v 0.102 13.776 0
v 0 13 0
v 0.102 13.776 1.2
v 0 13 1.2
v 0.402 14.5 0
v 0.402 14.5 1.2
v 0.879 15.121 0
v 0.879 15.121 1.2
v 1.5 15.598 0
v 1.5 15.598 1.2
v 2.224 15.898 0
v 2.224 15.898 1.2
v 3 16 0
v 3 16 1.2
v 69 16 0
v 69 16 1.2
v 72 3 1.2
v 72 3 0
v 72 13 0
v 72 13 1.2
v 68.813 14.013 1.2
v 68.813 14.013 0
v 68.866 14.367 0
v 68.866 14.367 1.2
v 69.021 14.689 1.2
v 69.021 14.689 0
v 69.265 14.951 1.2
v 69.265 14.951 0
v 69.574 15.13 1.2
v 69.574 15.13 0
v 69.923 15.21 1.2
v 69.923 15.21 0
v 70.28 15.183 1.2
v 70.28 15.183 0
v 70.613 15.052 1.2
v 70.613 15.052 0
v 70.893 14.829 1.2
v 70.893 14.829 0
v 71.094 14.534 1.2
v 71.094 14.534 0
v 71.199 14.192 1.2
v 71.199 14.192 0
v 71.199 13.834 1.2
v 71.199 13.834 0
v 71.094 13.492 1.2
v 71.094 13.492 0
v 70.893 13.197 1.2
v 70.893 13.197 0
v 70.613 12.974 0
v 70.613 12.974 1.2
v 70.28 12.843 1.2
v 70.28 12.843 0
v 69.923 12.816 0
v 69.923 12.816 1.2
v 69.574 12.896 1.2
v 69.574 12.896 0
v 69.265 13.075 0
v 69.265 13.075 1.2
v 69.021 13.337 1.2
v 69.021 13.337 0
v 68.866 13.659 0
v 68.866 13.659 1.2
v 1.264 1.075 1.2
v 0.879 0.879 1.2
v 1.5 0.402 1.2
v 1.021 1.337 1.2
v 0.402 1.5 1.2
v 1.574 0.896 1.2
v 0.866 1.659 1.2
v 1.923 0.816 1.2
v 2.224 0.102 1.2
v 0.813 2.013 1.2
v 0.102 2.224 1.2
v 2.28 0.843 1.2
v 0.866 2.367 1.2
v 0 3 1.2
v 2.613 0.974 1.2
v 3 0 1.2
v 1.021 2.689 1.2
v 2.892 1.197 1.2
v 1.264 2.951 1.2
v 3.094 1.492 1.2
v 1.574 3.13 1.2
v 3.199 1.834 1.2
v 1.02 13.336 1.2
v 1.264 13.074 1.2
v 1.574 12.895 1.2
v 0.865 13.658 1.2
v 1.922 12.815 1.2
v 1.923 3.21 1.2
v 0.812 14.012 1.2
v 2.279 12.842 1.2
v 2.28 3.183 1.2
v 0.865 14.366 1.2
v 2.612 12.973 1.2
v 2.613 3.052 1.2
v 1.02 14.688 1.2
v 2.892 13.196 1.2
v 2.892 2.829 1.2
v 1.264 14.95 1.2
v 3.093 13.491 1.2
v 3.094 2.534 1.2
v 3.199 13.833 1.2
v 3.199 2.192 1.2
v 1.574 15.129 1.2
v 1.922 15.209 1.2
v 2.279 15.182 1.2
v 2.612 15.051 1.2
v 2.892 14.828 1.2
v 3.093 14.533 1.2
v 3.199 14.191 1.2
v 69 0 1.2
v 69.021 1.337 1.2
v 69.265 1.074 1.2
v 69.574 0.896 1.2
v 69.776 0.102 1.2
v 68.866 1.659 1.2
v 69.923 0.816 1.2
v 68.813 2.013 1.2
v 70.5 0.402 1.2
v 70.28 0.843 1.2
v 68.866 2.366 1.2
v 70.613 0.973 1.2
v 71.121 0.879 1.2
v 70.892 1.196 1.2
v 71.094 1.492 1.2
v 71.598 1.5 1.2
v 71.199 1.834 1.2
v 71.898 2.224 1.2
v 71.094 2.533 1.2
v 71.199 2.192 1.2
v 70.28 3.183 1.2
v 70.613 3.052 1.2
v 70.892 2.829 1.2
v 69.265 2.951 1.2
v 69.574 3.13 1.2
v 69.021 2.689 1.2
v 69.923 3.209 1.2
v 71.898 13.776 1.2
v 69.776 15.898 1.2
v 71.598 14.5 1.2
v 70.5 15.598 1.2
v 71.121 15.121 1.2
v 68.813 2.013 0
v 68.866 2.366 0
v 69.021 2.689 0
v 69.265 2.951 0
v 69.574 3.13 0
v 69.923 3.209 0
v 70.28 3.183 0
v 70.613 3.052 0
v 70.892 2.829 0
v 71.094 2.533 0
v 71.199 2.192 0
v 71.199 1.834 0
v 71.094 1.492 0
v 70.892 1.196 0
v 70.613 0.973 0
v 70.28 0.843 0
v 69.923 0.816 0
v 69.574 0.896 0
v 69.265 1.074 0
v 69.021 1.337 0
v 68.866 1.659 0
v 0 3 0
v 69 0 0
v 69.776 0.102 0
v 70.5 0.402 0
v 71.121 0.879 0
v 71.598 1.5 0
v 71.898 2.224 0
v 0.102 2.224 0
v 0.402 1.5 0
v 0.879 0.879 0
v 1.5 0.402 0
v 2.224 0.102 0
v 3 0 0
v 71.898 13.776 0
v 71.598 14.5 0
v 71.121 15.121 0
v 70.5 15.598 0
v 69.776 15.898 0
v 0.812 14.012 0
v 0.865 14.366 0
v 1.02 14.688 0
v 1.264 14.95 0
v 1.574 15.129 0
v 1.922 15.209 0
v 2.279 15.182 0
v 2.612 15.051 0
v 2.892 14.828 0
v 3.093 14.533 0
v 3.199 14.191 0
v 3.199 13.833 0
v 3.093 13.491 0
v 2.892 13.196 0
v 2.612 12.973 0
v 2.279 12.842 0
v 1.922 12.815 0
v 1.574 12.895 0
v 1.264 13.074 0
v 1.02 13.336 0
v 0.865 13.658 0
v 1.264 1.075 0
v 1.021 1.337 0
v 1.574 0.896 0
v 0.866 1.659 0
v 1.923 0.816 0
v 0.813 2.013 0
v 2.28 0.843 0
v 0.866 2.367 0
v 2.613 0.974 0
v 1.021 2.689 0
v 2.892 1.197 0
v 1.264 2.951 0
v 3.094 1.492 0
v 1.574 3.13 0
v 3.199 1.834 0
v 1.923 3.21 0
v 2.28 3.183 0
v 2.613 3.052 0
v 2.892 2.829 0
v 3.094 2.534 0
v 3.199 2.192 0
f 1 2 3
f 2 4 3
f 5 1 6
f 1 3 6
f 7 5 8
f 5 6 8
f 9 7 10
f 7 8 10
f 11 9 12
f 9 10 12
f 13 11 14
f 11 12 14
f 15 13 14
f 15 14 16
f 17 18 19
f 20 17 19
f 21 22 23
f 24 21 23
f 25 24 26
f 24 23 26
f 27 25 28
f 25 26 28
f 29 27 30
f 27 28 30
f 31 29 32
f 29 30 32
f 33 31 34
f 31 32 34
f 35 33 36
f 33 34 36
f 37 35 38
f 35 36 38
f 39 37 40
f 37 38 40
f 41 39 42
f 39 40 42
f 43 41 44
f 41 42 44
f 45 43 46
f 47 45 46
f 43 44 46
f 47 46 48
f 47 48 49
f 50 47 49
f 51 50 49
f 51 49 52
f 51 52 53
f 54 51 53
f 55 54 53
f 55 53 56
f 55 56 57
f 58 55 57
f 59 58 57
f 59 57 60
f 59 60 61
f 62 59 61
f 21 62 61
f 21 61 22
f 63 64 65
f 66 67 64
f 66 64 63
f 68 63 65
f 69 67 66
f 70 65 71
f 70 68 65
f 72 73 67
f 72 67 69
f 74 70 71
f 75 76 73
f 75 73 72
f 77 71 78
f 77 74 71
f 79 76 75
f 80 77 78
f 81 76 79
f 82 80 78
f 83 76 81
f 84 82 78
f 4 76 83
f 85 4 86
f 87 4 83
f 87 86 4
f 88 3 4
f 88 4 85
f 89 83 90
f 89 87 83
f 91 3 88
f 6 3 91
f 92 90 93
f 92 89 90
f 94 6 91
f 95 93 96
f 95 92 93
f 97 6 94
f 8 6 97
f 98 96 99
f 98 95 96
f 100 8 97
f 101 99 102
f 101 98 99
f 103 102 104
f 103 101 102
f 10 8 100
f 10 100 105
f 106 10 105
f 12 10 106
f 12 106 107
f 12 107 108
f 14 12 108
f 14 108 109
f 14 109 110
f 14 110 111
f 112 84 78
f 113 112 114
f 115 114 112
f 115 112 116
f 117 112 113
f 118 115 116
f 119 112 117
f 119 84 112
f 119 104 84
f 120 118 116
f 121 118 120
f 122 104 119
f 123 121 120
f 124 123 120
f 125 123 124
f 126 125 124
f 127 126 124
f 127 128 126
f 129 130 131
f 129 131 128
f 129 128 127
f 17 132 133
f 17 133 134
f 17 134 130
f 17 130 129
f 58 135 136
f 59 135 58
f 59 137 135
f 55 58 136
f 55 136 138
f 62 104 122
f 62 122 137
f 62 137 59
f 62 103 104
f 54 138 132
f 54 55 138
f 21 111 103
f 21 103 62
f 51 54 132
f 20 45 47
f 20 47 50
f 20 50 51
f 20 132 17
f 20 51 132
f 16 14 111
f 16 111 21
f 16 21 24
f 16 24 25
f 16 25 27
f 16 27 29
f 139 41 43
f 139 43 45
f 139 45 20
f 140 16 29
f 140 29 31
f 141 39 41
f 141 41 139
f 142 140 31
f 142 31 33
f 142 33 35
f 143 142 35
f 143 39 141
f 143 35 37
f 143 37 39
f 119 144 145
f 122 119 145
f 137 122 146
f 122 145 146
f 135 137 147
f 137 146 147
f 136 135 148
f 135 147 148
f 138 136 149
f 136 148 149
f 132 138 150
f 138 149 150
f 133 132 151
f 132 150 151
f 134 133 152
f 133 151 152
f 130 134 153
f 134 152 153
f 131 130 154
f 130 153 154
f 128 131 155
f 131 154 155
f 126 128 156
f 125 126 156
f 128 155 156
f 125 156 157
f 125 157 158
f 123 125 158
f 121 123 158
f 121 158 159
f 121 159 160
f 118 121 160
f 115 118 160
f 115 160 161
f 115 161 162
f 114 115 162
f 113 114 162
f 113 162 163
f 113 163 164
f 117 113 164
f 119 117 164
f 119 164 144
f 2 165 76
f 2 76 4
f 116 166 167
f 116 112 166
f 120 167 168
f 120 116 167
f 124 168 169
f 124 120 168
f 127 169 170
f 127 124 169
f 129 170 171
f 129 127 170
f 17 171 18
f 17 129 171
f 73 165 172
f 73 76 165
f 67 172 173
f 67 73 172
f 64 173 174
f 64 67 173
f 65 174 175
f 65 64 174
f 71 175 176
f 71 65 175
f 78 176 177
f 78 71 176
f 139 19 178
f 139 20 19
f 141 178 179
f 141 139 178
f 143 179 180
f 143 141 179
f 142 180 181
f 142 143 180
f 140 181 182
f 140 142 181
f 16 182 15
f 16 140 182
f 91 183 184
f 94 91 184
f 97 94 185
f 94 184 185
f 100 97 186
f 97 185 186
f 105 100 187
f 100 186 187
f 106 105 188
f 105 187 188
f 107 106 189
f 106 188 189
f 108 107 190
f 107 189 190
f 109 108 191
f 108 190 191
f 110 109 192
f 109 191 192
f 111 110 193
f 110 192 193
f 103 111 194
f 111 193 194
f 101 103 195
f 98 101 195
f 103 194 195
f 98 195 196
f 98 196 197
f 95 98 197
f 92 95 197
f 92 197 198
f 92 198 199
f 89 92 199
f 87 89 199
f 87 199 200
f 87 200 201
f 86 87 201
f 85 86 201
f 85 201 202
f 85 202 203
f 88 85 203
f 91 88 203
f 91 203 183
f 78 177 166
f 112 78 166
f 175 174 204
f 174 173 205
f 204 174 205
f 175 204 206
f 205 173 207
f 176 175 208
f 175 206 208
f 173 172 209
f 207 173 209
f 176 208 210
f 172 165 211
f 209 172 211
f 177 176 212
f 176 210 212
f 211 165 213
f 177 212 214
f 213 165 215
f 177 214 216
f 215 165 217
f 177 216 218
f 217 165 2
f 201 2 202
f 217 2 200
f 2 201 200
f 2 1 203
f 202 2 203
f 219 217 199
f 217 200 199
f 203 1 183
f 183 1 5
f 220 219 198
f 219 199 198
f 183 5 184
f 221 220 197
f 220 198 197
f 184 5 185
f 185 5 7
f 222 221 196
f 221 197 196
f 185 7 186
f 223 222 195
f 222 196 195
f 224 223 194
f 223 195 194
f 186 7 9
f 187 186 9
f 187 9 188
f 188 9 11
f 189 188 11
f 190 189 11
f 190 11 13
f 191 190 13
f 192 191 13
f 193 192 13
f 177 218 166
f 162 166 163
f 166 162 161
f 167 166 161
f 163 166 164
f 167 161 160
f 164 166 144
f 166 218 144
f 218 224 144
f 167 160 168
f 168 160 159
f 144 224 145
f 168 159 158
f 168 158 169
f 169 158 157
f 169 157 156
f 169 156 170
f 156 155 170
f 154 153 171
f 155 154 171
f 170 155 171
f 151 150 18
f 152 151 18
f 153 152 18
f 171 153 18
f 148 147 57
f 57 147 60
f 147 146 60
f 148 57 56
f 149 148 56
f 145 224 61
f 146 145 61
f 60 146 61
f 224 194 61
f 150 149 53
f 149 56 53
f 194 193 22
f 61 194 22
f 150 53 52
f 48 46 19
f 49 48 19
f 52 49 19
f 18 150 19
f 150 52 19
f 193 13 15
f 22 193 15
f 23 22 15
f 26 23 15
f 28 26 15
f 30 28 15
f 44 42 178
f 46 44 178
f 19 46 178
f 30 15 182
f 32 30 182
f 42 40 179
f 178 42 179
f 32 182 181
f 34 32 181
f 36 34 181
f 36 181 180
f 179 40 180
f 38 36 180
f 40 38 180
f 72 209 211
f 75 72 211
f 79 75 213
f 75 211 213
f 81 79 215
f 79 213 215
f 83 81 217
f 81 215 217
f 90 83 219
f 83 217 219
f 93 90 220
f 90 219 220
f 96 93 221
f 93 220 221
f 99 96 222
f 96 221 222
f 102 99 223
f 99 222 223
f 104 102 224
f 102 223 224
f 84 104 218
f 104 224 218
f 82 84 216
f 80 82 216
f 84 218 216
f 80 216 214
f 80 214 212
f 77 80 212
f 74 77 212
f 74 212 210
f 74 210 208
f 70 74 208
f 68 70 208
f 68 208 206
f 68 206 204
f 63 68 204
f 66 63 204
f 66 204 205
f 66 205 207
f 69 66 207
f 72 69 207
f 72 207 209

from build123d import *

# Parameters (mm, degrees)
SKETCH_1_W          = 72
SKETCH_1_H          = 16
EXTRUDE_1_DEPTH     = 1.2
FILLET_1_R          = 3
CUT_EXTRUDE_1_REACH = 75.766
SKETCH_3_R          = 1.2


with BuildPart() as part:
    # 草图1 → 凸台-拉伸1 (new body)
    with BuildSketch(Plane.XY):
        with Locations((36, 8)):
            Rectangle(SKETCH_1_W, SKETCH_1_H)
    extrude(amount=EXTRUDE_1_DEPTH)

    # 圆角1
    fillet_1_edges = [part.edges().sort_by_distance(p)[0] for p in [
        (0, 16, 0.6),
        (72, 16, 0.6),
        (72, 0, 0.6),
        (0, 0, 0.6),
    ]]
    fillet(fillet_1_edges, radius=FILLET_1_R)

    # 草图3 → 切除-拉伸1 (cut, up to next)
    with BuildSketch(Plane(origin=(0, 0, 0), x_dir=(-1, 0, 0), z_dir=(0, 0, -1)), mode=Mode.PRIVATE) as cut_extrude_1_sk1:
        with Locations((-70.012877826, 14.013032766)):
            Circle(SKETCH_3_R)
    cut_extrude_1_tool1 = extrude(cut_extrude_1_sk1.sketch, amount=-CUT_EXTRUDE_1_REACH, mode=Mode.PRIVATE) & part.part
    # 草图3 → 切除-拉伸1 (cut, up to next)
    with BuildSketch(Plane(origin=(0, 0, 0), x_dir=(-1, 0, 0), z_dir=(0, 0, -1)), mode=Mode.PRIVATE) as cut_extrude_1_sk2:
        with Locations((-70.012694945, 2.012672085)):
            Circle(SKETCH_3_R)
    cut_extrude_1_tool2 = extrude(cut_extrude_1_sk2.sketch, amount=-CUT_EXTRUDE_1_REACH, mode=Mode.PRIVATE) & part.part
    # 草图3 → 切除-拉伸1 (cut, up to next)
    with BuildSketch(Plane(origin=(0, 0, 0), x_dir=(-1, 0, 0), z_dir=(0, 0, -1)), mode=Mode.PRIVATE) as cut_extrude_1_sk3:
        with Locations((-2.011949988, 14.012003328)):
            Circle(SKETCH_3_R)
    cut_extrude_1_tool3 = extrude(cut_extrude_1_sk3.sketch, amount=-CUT_EXTRUDE_1_REACH, mode=Mode.PRIVATE) & part.part
    # 草图3 → 切除-拉伸1 (cut, up to next)
    with BuildSketch(Plane(origin=(0, 0, 0), x_dir=(-1, 0, 0), z_dir=(0, 0, -1)), mode=Mode.PRIVATE) as cut_extrude_1_sk4:
        with Locations((-2.012501905, 2.013009906)):
            Circle(SKETCH_3_R)
    cut_extrude_1_tool4 = extrude(cut_extrude_1_sk4.sketch, amount=-CUT_EXTRUDE_1_REACH, mode=Mode.PRIVATE) & part.part
    add(cut_extrude_1_tool1.solids().sort_by_distance((70.012878, 14.013033, 0))[0], mode=Mode.SUBTRACT)
    add(cut_extrude_1_tool2.solids().sort_by_distance((70.012695, 2.012672, 0))[0], mode=Mode.SUBTRACT)
    add(cut_extrude_1_tool3.solids().sort_by_distance((2.01195, 14.012003, 0))[0], mode=Mode.SUBTRACT)
    add(cut_extrude_1_tool4.solids().sort_by_distance((2.012502, 2.01301, 0))[0], mode=Mode.SUBTRACT)


solid = part.part
